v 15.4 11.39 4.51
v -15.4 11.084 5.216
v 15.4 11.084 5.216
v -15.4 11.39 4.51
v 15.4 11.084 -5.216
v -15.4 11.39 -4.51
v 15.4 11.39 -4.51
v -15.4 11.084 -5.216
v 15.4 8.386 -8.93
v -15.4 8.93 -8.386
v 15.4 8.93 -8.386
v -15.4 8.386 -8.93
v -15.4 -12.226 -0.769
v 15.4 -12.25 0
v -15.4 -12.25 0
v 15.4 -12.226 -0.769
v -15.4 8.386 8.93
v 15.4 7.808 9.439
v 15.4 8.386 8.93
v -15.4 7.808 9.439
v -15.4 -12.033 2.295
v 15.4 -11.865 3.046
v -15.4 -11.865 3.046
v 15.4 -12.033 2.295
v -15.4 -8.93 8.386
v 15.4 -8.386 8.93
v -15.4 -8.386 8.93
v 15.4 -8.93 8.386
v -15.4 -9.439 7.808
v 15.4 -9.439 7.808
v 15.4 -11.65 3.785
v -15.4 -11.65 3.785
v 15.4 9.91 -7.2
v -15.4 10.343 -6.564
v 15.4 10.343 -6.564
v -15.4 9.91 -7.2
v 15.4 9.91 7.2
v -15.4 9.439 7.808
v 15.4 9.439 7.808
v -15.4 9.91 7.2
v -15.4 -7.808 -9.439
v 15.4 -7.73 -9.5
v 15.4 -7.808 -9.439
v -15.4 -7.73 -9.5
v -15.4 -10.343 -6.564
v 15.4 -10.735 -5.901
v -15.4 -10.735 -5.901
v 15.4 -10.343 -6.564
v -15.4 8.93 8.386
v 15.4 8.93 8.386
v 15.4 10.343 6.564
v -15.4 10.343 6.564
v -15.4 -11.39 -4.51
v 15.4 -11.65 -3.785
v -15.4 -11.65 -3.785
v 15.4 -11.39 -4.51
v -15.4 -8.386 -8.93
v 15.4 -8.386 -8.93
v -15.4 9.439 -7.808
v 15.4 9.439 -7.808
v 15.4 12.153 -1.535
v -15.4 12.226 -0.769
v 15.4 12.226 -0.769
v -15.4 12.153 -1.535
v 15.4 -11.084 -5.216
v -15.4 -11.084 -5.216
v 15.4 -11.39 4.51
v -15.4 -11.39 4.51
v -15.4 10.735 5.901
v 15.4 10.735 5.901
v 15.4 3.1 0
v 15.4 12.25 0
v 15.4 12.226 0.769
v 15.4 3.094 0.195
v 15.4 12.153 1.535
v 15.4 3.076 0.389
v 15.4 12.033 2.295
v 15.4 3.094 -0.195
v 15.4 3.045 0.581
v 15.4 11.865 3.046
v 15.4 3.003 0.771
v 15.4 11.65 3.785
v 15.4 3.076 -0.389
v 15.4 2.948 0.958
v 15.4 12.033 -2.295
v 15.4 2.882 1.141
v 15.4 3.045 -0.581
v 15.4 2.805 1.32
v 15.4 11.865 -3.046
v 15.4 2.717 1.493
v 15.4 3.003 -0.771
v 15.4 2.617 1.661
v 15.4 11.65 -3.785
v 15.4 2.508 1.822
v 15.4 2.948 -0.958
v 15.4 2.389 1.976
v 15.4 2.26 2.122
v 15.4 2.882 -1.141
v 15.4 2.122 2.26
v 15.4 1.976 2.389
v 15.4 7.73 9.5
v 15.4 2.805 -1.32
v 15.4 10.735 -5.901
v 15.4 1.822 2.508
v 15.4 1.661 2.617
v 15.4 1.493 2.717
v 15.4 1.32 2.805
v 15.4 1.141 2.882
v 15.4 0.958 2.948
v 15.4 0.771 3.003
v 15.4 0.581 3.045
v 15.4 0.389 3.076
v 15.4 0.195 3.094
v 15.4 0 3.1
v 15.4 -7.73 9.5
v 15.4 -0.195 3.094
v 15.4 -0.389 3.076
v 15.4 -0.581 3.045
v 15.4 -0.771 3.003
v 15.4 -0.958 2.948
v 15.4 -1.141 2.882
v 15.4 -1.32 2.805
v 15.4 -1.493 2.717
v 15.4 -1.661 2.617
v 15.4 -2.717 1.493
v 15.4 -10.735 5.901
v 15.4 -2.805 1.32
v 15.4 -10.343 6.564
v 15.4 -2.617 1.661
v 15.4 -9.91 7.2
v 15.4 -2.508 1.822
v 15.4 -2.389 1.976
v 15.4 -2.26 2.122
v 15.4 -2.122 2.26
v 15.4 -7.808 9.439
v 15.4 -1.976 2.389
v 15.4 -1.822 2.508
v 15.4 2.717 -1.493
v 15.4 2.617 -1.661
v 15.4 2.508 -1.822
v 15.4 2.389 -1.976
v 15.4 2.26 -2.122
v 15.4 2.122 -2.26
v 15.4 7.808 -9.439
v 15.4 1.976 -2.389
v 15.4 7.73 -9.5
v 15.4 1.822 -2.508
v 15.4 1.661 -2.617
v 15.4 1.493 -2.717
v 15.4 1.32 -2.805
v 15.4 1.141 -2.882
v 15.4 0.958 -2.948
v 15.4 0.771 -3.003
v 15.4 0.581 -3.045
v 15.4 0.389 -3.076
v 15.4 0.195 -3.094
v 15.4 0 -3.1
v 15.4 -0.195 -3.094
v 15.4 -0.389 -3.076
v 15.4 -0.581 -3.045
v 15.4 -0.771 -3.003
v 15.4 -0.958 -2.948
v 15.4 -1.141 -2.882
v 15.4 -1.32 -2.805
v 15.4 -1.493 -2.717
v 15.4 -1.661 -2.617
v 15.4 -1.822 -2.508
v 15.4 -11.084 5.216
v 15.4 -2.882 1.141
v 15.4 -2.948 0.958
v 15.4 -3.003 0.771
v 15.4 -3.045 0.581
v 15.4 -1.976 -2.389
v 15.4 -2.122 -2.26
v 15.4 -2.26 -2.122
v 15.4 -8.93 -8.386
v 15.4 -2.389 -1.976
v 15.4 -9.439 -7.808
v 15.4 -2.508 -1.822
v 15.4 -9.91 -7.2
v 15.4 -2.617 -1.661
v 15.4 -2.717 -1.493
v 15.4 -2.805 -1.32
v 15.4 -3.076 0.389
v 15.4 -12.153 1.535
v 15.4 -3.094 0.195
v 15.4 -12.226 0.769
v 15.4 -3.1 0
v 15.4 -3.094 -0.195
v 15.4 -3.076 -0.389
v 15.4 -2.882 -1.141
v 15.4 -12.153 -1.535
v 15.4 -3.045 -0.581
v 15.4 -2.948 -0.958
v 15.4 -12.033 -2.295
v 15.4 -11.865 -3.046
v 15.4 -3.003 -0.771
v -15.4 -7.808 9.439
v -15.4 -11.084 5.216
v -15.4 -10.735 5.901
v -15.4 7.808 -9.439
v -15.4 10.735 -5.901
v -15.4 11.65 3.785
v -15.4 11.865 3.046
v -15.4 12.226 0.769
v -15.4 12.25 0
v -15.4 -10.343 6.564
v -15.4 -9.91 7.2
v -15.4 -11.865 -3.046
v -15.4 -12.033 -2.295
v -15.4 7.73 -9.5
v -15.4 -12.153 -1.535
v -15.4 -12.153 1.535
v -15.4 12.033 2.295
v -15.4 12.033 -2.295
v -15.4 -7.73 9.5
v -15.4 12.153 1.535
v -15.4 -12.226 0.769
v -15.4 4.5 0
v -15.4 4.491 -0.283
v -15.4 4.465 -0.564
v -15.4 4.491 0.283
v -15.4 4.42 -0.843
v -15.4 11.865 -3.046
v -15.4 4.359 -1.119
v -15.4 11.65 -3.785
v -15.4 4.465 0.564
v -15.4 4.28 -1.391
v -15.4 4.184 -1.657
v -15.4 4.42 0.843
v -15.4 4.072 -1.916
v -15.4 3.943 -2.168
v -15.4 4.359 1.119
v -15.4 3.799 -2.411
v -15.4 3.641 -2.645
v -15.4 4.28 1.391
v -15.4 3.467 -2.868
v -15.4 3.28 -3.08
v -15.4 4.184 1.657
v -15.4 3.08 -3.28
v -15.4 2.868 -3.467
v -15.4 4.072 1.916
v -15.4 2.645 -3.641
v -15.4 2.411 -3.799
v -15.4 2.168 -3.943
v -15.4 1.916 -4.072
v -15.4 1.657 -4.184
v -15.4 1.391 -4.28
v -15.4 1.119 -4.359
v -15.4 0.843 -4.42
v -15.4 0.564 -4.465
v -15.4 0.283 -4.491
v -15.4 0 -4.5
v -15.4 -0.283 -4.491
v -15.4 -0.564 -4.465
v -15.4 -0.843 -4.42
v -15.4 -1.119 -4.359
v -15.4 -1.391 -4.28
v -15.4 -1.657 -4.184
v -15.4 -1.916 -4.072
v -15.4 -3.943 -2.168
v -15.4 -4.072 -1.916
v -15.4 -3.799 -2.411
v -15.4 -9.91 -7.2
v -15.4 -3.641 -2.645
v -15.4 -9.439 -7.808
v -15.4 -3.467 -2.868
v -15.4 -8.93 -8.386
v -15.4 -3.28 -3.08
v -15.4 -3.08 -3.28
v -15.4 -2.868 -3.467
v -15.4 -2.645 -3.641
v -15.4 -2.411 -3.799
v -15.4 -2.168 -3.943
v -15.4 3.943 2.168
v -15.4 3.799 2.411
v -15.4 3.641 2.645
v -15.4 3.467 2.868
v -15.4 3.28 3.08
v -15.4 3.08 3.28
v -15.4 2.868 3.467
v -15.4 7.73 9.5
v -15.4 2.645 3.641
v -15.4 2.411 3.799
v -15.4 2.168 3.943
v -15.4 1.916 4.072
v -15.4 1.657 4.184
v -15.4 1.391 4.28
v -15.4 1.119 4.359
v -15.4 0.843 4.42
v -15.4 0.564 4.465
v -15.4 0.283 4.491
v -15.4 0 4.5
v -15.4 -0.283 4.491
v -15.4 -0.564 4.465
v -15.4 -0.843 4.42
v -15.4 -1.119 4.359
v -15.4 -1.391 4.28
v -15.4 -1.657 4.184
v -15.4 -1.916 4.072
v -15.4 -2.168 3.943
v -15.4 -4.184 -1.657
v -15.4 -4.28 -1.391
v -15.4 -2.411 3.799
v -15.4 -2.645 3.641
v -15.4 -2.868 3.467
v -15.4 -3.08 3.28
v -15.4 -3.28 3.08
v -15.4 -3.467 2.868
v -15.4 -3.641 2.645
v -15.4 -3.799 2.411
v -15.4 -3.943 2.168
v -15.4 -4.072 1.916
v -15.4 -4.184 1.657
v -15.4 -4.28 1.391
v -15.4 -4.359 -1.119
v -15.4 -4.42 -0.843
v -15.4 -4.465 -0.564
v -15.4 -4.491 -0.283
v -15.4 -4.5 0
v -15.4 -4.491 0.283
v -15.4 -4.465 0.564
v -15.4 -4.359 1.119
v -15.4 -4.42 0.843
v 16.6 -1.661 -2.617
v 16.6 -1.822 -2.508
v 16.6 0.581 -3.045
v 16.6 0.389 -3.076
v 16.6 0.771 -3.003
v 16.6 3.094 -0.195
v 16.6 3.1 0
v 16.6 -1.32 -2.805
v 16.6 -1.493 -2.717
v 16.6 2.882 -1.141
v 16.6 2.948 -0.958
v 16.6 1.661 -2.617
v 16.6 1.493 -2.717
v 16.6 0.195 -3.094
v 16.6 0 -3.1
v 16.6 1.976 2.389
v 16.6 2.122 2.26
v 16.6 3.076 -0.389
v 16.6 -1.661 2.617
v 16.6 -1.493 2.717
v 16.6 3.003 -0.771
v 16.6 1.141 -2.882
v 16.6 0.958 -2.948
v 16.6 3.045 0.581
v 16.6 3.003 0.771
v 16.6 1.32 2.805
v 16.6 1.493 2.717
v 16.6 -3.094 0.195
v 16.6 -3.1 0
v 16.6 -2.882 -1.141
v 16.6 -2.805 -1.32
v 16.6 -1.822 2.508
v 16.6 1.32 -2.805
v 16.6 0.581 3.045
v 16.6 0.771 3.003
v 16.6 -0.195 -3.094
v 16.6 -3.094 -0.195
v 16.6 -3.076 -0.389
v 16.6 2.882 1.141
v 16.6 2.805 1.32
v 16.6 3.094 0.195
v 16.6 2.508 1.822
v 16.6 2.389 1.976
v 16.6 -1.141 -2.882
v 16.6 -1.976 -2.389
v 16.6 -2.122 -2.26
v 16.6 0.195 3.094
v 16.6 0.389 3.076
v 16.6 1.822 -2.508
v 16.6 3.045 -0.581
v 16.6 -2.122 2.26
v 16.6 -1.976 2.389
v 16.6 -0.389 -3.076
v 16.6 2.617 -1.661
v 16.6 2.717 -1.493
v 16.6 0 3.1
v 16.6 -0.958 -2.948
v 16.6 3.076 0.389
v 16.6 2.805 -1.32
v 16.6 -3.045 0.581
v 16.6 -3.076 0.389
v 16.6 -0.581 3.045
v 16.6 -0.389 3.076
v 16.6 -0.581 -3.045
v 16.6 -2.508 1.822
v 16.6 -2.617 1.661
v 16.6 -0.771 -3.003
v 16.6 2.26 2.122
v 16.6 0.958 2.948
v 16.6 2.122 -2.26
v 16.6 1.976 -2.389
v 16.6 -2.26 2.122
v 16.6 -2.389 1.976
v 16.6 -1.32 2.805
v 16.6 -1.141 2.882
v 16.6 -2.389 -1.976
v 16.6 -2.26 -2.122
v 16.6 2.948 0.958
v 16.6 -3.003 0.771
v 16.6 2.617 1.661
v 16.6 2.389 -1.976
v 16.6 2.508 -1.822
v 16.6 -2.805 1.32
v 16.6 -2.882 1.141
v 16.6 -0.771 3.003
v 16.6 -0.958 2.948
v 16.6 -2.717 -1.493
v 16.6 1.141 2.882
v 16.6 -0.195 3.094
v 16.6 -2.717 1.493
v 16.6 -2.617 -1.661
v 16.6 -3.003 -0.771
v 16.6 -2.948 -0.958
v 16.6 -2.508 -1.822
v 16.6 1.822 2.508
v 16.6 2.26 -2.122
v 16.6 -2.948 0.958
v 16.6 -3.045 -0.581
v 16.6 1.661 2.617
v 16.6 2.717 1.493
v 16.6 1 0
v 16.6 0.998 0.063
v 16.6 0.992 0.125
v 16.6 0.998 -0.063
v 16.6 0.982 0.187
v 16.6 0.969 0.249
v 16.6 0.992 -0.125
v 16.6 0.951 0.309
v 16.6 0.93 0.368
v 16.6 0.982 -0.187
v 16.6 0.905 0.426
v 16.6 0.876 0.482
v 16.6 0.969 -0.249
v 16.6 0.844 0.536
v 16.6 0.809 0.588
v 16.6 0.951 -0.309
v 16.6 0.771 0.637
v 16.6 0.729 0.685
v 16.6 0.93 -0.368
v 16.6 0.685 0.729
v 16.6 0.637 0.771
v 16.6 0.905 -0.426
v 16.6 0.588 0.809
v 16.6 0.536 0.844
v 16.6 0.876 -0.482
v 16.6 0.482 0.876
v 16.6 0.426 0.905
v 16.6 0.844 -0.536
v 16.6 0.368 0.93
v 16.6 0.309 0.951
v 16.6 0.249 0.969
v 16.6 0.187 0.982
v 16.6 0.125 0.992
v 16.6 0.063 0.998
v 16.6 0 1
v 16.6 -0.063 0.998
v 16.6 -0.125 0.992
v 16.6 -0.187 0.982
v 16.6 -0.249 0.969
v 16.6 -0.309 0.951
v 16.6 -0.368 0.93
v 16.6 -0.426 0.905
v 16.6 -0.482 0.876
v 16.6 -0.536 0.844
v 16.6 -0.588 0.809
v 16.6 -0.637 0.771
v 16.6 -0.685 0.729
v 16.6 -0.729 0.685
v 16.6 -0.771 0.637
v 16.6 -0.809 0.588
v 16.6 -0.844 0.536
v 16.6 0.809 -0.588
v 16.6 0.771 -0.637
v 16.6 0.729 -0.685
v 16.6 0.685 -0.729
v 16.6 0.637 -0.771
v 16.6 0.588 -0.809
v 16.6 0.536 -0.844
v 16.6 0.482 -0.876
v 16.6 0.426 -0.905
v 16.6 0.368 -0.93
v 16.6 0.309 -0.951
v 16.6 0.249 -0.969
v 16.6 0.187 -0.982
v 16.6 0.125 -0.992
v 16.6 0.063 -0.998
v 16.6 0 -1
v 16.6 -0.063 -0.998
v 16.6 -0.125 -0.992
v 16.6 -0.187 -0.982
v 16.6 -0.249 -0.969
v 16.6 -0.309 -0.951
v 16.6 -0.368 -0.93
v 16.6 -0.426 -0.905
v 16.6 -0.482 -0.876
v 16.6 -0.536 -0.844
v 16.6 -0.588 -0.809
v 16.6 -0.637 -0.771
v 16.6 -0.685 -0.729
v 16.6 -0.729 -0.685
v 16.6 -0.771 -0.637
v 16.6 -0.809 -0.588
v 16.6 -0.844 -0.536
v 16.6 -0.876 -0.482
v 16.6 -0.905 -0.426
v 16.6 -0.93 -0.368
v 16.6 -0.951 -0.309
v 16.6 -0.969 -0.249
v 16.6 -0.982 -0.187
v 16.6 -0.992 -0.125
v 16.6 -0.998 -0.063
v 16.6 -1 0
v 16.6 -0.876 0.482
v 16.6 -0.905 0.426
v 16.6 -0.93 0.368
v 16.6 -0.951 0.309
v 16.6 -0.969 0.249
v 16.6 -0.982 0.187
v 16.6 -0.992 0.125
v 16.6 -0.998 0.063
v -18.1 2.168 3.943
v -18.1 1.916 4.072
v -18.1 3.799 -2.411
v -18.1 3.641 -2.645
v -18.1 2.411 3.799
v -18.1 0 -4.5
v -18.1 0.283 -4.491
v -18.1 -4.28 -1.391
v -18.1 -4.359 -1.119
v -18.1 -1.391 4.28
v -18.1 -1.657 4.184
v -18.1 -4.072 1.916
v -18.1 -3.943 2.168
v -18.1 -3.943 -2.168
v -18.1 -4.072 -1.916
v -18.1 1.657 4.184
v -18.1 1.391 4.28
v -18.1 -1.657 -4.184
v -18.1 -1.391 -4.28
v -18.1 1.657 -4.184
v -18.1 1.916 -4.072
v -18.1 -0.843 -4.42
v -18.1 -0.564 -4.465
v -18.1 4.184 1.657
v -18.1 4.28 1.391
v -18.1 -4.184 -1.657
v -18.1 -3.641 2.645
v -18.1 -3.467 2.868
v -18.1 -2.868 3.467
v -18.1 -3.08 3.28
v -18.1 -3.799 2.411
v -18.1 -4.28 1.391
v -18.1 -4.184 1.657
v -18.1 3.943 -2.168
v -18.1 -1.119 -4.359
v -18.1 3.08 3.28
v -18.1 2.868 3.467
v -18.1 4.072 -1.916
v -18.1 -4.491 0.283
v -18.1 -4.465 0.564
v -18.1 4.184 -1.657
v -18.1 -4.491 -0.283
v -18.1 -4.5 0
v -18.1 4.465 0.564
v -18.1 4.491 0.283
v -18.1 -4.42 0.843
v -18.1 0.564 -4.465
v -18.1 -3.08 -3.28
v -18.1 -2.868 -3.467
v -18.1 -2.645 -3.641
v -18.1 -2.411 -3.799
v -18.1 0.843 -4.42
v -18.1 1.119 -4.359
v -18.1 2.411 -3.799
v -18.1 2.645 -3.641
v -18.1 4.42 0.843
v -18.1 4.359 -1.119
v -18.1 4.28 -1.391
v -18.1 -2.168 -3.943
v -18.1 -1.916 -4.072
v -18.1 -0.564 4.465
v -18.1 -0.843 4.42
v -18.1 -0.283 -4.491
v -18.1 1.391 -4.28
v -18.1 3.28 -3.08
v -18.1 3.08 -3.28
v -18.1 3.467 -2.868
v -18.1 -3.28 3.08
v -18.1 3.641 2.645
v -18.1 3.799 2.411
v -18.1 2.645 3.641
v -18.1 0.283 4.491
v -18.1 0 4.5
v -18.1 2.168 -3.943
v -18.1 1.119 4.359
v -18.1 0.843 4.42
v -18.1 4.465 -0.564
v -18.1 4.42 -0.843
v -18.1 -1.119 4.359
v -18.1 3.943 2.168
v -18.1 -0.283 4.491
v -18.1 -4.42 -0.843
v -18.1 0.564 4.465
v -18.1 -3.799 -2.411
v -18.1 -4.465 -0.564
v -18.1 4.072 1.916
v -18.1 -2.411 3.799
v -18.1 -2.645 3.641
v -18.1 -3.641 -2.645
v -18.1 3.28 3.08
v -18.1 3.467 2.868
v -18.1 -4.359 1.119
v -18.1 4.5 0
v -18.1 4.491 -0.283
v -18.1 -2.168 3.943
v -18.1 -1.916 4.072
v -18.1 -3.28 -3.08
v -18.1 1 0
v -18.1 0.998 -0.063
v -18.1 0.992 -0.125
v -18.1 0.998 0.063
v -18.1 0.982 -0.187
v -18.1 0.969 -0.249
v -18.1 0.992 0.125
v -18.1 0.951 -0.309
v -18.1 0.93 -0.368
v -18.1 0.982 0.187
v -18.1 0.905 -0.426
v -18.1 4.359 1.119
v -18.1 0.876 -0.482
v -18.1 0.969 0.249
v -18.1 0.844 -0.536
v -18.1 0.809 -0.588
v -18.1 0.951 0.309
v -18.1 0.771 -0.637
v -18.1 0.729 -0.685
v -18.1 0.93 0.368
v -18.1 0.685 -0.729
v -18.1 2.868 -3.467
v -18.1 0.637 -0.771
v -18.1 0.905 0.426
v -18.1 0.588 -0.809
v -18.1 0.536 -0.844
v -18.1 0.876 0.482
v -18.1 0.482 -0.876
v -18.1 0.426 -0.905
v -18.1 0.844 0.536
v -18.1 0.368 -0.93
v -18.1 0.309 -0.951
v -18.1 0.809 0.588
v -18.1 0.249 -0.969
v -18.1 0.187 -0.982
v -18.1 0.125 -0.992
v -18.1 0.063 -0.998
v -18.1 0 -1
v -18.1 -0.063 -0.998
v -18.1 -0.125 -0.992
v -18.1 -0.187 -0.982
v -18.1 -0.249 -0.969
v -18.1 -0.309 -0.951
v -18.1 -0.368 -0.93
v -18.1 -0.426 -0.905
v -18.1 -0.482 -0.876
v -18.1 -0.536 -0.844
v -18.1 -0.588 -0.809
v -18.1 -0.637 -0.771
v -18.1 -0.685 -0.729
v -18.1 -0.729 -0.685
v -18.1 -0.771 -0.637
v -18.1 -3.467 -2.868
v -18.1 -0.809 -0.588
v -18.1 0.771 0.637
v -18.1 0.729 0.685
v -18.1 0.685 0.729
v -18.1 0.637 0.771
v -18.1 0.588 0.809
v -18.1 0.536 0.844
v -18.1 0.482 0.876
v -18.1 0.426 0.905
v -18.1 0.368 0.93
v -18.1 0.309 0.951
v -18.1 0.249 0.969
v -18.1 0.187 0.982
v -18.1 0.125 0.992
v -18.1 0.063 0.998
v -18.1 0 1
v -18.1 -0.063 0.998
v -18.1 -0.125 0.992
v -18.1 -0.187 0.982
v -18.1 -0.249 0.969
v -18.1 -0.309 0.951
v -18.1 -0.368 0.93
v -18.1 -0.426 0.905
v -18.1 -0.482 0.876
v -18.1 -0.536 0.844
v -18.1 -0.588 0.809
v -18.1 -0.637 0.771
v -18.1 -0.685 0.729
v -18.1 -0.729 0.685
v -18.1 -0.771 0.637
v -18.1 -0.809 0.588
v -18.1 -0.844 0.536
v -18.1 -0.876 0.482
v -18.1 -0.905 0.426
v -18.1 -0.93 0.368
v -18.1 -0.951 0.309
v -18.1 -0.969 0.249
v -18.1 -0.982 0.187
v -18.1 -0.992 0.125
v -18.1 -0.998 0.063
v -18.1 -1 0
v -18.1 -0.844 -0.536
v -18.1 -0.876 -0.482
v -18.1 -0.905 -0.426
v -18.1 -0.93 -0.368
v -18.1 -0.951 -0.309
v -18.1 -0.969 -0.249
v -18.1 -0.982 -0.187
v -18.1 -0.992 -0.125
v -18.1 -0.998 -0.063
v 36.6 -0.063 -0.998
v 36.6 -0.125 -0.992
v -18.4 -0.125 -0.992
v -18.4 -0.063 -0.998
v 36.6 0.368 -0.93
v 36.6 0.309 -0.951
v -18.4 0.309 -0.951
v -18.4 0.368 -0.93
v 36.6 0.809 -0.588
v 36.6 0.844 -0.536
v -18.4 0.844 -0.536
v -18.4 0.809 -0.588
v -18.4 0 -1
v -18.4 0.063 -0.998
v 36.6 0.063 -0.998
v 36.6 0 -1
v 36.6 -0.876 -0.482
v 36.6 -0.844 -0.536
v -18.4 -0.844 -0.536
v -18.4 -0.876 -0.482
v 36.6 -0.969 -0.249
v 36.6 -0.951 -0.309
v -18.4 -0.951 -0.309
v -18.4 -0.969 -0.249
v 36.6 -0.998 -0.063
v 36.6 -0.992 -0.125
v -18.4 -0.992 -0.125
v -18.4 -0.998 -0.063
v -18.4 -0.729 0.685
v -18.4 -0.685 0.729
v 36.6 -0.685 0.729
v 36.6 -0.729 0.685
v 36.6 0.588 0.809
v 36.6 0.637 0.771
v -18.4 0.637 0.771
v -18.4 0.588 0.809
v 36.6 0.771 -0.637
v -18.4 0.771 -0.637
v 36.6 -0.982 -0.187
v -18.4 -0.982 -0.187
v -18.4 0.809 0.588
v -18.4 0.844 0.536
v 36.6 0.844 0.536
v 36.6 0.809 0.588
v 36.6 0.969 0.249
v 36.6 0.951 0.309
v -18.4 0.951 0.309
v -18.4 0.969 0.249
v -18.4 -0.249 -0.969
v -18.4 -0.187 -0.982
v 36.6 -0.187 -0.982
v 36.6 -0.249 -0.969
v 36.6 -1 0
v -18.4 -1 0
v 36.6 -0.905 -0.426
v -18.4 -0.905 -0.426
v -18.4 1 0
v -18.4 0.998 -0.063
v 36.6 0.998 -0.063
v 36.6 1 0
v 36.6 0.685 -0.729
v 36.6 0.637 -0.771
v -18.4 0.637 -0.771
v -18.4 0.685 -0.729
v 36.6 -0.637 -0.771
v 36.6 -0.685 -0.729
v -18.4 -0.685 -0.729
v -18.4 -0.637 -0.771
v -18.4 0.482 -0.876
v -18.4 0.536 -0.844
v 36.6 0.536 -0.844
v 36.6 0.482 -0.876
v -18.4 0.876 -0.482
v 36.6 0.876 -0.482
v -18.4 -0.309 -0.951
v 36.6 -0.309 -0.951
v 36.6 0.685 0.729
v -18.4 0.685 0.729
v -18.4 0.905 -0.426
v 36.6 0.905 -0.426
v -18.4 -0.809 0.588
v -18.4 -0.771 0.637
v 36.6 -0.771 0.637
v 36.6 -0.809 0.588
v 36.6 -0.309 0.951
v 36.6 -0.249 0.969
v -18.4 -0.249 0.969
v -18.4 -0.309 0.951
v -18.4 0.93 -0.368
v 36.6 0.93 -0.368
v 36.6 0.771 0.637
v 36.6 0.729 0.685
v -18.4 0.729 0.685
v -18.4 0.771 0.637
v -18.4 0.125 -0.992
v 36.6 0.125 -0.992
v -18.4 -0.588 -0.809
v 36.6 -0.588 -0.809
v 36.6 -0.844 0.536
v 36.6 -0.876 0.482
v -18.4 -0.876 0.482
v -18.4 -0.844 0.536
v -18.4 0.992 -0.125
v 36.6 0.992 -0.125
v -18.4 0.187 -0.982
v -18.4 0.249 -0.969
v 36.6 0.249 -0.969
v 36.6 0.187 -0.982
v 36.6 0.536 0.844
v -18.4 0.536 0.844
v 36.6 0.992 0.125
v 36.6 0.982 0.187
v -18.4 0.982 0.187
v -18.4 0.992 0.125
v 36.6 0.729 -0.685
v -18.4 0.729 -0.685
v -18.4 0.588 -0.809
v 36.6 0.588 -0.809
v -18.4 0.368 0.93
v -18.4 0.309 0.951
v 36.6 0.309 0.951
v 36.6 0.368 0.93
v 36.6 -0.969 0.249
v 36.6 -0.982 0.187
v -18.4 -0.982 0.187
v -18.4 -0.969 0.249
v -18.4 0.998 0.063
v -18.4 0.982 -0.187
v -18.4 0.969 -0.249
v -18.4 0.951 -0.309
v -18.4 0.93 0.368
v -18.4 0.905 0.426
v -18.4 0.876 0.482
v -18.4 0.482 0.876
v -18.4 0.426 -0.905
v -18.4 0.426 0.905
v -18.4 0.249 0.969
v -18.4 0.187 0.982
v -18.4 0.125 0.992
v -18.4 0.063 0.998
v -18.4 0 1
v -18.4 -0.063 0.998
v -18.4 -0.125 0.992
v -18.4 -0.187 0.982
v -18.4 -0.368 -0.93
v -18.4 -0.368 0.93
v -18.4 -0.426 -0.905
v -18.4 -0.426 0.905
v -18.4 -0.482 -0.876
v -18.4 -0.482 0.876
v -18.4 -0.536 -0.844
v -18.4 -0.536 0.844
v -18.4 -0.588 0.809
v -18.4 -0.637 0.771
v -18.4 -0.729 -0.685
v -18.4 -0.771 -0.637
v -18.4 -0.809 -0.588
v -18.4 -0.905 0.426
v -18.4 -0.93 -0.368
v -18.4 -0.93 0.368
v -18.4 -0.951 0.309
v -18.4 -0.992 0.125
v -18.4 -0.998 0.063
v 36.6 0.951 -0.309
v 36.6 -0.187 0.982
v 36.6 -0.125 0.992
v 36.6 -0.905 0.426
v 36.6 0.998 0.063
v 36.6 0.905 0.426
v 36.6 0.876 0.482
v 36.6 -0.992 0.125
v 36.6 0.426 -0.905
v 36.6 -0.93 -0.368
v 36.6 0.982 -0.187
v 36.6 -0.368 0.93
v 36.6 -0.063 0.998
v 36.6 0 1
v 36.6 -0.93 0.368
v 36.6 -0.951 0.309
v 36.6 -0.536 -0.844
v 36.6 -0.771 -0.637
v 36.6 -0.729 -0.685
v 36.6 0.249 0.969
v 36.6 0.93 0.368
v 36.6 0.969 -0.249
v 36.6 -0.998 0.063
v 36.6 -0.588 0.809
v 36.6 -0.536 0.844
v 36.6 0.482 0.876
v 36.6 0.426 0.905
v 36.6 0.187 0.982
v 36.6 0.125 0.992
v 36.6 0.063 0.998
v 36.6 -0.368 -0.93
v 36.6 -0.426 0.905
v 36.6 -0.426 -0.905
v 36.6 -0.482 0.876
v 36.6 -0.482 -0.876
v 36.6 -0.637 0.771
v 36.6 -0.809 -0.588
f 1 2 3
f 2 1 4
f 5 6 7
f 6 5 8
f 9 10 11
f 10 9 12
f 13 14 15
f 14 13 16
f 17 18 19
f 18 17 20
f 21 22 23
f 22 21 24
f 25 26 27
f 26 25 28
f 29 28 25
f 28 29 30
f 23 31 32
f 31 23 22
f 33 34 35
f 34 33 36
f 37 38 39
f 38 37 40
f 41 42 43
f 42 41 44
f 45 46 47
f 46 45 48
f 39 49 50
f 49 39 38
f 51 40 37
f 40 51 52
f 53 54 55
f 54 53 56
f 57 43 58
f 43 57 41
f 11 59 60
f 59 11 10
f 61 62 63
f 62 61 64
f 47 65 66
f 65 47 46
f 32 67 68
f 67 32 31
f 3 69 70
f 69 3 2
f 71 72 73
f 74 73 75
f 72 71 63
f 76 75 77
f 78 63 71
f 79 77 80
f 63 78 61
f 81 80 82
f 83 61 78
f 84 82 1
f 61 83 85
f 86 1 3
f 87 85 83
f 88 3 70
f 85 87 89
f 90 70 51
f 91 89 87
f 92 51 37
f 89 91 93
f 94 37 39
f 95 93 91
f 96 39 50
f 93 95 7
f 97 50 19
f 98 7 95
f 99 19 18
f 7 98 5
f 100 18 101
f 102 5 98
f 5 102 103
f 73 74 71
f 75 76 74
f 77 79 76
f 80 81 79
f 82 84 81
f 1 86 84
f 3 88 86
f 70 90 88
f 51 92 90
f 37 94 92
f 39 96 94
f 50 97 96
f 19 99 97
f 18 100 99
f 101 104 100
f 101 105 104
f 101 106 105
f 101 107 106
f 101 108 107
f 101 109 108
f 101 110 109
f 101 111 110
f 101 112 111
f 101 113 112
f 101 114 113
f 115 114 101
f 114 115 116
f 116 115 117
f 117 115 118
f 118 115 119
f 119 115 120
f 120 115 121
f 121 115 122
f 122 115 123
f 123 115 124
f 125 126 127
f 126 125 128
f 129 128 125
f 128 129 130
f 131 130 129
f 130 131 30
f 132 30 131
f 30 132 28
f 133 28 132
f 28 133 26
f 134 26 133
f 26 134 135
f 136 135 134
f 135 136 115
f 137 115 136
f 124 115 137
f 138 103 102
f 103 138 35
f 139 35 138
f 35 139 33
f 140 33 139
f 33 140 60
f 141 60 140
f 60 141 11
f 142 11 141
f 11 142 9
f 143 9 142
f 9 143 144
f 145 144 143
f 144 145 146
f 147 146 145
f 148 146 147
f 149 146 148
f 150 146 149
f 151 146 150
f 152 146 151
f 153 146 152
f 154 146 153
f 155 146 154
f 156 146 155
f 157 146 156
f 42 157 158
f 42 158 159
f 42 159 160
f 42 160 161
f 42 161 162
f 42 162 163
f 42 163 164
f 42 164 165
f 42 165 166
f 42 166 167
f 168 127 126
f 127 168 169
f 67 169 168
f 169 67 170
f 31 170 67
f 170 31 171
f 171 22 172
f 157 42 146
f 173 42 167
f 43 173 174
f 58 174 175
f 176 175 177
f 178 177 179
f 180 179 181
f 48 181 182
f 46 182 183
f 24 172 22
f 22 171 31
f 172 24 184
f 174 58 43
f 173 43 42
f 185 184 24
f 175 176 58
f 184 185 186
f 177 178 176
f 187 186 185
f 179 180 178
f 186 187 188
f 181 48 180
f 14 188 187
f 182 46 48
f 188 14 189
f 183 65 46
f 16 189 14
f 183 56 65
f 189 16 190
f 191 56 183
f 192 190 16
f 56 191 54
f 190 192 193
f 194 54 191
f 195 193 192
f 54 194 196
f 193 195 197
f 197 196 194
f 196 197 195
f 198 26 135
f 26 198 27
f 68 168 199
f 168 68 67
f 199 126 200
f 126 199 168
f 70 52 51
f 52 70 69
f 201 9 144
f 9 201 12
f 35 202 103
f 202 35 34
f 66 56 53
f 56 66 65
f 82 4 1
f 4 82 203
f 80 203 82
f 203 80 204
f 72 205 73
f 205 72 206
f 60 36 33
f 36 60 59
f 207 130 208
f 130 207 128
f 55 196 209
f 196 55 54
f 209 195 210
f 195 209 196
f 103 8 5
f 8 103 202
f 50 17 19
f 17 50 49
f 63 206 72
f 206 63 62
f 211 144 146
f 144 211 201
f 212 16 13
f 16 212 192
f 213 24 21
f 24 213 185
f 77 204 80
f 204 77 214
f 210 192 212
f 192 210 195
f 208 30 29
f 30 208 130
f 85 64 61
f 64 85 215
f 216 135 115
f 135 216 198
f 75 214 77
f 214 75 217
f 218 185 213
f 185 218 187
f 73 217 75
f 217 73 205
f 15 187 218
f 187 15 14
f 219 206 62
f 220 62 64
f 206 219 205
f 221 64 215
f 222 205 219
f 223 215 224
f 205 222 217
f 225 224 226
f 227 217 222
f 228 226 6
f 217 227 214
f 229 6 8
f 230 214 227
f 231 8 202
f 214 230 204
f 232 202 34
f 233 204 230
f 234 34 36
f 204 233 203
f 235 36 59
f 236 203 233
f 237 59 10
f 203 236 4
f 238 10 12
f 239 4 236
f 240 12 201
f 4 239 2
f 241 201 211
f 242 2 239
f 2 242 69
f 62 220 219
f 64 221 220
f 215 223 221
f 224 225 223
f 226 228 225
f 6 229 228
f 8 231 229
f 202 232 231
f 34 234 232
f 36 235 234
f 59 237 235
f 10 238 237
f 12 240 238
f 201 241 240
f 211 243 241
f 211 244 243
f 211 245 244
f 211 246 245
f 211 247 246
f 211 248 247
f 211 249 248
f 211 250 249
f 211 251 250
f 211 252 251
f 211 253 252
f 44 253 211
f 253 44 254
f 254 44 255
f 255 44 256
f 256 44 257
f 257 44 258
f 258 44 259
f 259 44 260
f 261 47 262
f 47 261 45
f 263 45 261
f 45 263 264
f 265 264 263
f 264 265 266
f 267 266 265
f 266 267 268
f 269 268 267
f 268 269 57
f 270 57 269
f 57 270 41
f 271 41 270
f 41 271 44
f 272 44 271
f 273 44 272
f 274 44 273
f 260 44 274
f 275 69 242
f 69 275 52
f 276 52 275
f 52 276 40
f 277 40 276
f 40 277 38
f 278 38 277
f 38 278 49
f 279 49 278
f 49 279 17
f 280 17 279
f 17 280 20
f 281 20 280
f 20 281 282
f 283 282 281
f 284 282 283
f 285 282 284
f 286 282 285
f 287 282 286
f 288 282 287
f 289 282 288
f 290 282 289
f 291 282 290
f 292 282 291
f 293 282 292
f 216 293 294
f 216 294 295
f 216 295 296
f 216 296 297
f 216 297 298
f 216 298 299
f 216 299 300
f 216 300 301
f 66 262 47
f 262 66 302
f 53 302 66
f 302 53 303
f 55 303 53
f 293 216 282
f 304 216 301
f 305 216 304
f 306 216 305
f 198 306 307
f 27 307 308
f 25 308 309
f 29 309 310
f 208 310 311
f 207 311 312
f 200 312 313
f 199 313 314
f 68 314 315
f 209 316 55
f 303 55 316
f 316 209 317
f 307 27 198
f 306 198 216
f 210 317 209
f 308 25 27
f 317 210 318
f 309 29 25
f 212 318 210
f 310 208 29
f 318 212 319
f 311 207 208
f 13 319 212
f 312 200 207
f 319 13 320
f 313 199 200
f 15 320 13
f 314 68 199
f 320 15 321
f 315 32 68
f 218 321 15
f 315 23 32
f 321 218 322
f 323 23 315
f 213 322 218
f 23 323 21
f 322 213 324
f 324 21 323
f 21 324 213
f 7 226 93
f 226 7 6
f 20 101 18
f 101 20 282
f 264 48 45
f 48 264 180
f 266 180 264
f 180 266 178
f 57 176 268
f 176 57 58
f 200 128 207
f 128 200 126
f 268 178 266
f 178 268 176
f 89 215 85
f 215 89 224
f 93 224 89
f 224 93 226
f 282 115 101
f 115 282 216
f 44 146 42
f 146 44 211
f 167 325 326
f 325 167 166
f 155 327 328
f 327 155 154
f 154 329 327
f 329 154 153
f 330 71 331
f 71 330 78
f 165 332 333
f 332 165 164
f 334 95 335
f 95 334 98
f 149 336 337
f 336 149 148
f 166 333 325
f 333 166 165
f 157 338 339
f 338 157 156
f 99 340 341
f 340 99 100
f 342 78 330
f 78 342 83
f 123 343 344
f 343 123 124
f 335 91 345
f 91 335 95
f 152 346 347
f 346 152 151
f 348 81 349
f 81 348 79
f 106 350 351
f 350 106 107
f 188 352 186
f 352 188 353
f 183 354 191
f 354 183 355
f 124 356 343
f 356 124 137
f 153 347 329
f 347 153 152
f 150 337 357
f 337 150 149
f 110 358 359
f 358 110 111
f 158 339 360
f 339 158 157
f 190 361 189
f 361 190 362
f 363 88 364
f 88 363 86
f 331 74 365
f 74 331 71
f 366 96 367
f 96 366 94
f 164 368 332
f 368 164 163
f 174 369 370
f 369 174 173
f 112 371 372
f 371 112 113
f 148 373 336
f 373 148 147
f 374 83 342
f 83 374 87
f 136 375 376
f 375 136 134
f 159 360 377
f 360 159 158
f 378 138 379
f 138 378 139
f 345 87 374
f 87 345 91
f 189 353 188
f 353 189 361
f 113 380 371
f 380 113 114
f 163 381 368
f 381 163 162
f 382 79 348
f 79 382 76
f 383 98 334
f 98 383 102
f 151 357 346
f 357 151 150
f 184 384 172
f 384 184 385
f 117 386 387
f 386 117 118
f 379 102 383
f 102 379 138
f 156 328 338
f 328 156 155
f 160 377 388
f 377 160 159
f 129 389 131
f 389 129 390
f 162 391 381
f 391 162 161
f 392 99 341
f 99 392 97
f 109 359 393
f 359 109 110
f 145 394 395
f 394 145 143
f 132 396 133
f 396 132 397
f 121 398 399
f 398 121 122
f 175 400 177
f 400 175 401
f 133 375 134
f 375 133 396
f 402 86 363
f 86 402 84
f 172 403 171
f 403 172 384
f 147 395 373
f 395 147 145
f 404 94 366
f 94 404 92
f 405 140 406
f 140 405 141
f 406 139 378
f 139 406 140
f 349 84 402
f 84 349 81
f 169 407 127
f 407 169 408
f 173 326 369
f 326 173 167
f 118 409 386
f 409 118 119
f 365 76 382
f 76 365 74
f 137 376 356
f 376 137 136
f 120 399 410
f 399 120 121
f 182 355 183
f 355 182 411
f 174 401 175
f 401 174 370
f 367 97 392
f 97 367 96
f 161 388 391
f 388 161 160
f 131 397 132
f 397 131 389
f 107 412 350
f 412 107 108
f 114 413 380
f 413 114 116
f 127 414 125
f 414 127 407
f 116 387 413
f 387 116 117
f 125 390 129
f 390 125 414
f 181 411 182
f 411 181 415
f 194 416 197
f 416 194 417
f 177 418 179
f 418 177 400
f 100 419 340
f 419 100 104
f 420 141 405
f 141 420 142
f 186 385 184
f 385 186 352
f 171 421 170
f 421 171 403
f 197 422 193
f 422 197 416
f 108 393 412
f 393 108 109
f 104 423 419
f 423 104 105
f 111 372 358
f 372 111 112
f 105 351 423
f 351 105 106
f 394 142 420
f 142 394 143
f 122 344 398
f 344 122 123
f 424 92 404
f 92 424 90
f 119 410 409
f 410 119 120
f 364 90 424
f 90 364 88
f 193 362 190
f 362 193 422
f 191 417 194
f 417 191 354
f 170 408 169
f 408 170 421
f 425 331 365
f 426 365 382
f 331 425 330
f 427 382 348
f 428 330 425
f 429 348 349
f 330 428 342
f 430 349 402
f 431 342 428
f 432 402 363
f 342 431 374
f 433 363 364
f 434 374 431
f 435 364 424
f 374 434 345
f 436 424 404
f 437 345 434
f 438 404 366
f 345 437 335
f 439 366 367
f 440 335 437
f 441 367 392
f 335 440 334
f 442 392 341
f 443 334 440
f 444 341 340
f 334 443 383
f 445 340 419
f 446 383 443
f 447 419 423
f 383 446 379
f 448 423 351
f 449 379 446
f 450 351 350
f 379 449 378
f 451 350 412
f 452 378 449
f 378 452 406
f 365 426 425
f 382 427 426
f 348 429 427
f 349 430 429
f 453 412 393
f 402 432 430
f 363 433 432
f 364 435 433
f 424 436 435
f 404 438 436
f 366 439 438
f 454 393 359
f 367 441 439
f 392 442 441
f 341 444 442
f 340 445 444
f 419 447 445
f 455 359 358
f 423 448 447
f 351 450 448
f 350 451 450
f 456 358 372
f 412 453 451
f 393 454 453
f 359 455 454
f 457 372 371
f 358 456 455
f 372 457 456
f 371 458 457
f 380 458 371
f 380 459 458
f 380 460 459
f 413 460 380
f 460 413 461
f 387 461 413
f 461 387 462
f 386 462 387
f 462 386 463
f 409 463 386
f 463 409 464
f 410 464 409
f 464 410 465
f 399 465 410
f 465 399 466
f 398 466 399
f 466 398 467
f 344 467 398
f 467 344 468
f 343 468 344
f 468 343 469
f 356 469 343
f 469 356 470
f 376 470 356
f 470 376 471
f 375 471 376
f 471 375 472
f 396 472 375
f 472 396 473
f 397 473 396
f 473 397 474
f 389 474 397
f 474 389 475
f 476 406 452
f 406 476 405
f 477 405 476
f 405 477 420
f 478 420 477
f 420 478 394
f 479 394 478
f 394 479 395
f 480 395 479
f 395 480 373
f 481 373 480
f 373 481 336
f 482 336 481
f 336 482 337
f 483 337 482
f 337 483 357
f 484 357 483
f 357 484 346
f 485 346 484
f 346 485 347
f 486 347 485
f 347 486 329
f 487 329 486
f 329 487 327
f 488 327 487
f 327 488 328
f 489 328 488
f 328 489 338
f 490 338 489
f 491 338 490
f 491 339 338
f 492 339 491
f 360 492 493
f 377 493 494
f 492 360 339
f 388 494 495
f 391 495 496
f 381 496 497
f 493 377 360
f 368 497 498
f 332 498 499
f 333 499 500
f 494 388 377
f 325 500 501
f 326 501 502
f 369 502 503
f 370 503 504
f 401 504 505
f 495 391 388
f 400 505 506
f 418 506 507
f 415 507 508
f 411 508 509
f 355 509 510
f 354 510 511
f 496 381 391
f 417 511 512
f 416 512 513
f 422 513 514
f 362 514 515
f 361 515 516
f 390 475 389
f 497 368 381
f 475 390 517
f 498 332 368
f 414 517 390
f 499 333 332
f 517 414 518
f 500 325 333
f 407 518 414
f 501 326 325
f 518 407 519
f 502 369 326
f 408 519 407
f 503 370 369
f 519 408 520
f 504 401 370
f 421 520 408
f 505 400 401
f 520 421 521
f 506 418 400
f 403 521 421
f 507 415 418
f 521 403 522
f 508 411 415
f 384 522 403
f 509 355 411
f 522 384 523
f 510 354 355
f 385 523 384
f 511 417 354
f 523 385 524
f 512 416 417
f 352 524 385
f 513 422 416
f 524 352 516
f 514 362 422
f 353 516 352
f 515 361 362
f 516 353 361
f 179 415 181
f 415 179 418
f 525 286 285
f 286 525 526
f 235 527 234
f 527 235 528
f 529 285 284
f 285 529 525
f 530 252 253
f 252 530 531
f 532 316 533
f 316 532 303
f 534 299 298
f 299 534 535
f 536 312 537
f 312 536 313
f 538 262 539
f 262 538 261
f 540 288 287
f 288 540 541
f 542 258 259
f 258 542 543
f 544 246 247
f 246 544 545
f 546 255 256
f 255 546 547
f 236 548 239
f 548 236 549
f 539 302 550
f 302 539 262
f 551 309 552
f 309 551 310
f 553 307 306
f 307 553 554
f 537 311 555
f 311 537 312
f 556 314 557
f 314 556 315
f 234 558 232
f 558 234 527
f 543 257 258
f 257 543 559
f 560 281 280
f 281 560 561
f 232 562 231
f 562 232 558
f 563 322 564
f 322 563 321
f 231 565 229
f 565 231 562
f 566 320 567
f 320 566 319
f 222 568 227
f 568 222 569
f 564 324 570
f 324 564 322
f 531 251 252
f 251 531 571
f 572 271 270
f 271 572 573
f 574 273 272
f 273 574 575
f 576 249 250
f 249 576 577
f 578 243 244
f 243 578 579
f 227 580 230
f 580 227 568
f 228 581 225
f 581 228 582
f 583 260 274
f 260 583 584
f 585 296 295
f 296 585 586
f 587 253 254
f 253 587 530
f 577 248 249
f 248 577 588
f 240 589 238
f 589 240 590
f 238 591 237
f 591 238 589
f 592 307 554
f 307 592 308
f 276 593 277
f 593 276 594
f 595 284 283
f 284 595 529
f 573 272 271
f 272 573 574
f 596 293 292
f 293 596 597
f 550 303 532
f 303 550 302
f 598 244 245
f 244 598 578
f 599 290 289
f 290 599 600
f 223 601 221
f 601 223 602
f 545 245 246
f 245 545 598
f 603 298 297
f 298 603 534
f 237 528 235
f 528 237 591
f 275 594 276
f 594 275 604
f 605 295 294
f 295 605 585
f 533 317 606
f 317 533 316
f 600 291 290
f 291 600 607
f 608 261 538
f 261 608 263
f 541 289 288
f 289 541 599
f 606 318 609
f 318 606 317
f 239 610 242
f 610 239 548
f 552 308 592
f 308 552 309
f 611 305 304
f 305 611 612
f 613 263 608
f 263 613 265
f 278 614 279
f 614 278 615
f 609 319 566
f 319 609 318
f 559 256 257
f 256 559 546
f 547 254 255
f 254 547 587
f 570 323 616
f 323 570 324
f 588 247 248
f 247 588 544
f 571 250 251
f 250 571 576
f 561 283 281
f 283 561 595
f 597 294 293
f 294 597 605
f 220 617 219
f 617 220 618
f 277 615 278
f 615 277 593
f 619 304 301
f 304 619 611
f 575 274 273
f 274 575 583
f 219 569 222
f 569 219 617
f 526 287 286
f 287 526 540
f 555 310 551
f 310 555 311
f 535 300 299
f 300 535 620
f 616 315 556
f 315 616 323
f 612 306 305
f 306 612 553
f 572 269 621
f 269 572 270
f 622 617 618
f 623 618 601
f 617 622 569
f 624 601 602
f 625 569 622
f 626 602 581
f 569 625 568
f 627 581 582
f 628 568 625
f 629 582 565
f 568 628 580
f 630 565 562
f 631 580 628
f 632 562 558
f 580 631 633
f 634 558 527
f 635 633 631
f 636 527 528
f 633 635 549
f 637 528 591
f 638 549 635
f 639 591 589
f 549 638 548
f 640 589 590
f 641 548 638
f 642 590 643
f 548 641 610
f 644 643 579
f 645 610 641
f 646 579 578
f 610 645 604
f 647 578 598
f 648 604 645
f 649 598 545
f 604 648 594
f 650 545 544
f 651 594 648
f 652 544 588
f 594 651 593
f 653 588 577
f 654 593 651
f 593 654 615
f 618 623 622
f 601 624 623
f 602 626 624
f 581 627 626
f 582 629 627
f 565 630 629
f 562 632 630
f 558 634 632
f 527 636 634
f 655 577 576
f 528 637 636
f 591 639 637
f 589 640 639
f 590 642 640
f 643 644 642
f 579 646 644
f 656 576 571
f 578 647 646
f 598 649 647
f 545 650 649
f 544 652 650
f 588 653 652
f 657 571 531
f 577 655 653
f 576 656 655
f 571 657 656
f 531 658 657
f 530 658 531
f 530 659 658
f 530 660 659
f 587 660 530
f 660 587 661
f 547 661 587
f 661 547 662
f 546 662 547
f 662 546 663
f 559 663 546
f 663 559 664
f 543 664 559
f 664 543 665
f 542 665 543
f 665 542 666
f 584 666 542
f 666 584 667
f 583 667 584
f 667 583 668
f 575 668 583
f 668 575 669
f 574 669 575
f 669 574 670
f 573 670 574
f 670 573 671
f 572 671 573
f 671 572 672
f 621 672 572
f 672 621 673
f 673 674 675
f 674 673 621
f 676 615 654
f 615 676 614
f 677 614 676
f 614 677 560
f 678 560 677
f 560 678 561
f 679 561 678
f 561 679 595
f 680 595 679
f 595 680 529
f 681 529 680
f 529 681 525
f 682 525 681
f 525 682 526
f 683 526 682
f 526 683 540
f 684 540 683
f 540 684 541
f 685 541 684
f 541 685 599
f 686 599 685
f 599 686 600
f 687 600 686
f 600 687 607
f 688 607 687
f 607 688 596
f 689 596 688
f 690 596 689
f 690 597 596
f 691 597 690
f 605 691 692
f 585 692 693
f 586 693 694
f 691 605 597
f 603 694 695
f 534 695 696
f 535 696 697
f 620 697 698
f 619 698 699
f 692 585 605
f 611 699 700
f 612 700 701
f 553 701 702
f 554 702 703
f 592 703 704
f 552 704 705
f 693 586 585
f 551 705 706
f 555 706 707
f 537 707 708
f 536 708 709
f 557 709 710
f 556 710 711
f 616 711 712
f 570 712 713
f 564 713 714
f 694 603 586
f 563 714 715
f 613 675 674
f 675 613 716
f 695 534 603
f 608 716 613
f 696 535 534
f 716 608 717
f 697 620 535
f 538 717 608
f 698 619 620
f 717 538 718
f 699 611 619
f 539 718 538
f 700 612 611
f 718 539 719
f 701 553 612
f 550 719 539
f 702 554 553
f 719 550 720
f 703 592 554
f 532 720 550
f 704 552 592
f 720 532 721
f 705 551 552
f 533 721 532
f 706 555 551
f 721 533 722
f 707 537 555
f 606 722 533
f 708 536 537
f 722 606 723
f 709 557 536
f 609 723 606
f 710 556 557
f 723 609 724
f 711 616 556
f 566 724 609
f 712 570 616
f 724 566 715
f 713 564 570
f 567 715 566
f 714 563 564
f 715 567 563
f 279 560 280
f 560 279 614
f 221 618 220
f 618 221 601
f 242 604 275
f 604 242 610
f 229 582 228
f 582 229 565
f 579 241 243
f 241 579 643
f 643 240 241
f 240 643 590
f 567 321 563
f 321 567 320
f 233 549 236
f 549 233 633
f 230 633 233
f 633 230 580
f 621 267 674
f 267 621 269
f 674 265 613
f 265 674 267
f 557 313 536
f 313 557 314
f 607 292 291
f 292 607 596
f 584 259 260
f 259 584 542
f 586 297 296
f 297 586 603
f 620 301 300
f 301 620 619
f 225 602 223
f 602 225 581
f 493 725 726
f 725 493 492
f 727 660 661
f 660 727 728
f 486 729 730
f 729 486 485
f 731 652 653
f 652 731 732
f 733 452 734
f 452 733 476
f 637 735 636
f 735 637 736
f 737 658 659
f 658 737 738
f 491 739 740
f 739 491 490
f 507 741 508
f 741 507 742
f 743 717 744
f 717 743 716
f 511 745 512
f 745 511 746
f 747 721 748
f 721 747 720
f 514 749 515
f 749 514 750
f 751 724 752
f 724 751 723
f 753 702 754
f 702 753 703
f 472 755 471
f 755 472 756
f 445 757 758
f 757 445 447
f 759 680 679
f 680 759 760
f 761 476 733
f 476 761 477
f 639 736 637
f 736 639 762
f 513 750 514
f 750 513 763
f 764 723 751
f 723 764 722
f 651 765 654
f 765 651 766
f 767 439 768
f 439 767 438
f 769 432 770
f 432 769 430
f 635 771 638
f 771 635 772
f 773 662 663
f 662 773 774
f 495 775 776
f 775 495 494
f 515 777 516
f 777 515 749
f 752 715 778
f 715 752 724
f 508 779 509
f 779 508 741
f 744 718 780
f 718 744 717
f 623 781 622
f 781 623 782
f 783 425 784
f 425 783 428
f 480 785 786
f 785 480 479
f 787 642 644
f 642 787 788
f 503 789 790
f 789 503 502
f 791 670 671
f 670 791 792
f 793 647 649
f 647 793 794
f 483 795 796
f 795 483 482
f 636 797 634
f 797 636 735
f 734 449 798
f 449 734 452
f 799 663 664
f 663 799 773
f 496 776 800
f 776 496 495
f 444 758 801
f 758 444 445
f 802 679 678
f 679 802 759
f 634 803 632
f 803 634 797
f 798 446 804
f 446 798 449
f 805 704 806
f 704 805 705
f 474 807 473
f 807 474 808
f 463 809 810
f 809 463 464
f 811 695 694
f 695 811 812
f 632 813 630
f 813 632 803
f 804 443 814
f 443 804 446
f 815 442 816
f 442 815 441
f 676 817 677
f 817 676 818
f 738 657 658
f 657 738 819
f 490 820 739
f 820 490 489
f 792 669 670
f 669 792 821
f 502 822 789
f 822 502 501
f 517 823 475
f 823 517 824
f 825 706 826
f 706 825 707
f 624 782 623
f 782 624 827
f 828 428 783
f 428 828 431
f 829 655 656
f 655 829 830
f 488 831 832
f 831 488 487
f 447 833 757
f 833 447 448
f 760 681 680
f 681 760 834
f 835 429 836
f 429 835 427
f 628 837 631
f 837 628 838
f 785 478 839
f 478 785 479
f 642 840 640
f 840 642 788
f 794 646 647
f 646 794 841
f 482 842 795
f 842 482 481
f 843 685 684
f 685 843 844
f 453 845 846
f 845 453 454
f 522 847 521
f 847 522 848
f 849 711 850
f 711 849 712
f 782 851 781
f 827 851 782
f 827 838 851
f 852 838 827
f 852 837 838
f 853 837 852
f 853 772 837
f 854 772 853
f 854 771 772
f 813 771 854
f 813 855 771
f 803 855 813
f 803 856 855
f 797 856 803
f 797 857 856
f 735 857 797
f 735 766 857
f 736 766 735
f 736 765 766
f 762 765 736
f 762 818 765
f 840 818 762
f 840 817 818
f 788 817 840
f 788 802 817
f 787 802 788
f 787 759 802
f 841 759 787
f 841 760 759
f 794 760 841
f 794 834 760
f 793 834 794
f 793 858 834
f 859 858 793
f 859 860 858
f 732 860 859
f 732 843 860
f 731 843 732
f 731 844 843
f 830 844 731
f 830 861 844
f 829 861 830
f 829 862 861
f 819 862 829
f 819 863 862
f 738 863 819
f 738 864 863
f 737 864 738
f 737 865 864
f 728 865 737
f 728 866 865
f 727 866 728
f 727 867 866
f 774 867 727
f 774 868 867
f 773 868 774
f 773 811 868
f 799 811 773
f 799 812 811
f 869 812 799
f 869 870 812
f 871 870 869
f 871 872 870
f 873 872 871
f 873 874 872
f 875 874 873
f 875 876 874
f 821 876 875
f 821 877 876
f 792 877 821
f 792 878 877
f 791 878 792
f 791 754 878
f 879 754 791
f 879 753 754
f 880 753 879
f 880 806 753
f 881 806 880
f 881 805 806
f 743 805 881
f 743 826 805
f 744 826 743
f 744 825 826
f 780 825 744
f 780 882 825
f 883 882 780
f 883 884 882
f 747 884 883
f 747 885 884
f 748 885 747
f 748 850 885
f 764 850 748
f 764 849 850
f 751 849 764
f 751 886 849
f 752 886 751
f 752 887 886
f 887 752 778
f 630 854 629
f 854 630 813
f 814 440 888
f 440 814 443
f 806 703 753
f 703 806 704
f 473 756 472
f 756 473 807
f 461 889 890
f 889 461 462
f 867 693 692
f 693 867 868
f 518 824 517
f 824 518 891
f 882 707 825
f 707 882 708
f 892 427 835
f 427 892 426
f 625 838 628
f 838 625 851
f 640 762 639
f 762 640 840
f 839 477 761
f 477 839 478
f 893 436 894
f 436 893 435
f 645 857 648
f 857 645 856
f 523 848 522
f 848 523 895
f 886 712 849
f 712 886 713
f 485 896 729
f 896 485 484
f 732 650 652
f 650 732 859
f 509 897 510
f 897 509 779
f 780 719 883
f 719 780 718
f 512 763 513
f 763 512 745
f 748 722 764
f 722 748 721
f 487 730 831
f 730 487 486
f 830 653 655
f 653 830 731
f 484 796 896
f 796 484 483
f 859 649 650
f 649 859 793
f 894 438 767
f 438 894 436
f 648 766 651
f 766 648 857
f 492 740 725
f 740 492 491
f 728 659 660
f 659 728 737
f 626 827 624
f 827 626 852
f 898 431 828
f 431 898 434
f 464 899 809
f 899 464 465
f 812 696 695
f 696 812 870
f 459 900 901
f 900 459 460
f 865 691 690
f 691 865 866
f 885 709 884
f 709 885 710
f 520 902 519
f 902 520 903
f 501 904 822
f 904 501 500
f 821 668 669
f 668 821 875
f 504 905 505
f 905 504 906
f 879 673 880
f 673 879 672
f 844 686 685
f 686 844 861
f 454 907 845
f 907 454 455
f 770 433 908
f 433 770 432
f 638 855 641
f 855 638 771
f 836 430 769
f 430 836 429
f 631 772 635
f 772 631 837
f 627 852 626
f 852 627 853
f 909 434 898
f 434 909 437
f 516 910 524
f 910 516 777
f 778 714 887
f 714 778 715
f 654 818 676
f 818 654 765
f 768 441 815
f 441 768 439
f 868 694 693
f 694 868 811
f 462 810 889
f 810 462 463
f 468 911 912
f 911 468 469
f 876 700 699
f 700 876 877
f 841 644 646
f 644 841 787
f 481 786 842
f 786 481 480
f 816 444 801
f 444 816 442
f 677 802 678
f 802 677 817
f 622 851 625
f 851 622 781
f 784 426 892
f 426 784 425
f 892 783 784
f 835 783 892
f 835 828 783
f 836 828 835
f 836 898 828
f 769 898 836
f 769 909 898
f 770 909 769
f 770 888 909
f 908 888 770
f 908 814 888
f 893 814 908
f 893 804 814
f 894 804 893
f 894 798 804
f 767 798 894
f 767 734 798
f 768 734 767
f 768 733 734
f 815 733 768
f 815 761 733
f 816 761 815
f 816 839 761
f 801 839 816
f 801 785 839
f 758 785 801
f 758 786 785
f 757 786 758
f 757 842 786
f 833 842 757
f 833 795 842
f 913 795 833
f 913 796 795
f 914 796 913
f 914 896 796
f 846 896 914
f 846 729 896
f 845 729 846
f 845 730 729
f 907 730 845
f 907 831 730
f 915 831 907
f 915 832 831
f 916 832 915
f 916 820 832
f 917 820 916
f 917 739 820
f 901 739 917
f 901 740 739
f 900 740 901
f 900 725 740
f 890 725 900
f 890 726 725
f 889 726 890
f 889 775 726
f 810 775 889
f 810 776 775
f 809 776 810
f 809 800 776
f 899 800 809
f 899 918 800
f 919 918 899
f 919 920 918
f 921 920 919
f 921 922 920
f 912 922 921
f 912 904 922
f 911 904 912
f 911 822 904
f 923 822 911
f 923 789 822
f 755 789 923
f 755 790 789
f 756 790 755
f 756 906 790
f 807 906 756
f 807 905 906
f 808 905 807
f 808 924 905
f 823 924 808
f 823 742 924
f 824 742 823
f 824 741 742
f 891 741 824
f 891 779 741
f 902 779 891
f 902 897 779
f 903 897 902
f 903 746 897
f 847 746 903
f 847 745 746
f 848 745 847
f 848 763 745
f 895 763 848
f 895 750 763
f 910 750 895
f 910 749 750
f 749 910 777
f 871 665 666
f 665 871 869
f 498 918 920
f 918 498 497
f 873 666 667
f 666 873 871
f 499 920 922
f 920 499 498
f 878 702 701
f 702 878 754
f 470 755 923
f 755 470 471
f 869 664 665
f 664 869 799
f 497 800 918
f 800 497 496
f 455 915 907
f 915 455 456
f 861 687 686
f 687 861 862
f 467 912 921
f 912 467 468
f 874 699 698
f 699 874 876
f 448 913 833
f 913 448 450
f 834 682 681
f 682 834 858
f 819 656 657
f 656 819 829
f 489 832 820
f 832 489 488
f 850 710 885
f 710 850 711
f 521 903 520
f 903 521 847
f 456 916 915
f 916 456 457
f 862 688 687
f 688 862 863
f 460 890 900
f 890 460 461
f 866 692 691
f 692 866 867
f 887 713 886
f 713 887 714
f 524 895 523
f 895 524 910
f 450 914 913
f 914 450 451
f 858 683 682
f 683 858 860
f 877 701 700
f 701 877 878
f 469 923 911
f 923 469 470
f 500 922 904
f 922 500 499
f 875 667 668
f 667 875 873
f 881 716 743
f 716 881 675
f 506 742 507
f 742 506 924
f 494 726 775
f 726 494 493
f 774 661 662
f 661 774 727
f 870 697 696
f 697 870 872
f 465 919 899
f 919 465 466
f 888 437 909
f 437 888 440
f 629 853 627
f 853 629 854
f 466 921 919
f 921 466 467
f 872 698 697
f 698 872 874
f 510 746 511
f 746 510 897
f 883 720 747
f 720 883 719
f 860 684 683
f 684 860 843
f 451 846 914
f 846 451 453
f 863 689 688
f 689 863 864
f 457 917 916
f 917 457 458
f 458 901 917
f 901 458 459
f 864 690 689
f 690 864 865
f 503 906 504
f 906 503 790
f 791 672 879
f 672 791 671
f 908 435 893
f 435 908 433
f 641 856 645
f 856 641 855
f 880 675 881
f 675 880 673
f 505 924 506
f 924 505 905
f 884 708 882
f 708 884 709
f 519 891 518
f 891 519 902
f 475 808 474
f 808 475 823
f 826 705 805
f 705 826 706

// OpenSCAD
/*
	Openscad modell for Johnson NF243G-20242 Motor

	2015 by ChrisMicro

*/

$fn=100; // resolution
manuFactoringOffset=0.5;

motorDiameter   = manuFactoringOffset+24;
motorHeight     = manuFactoringOffset+18.5;
motorBodyLength = manuFactoringOffset+30.3;

axisLength      = 20;
axisTotalLength = 55;
axisDiameter    = 2;

frontRingDiameter = 6.2;
frontRingLength   = 1.2;

backRingDiameter  = manuFactoringOffset+8.5;
backRingLength    = manuFactoringOffset+1.7+.5;

ringInlayOffset=2; // this is only to prevent rendering errors
 
motor();

function get_motorDiameter()=motorDiameter;
function get_motorHeight()=motorHeight;

axisShift=axisTotalLength-(motorBodyLength+frontRingLength+axisLength);


module motor()
{
	// front ring
	translate([motorBodyLength/2-ringInlayOffset,0,0]) rotate([0,90,0])	
		cylinder(h = frontRingLength+ringInlayOffset, r = frontRingDiameter/2, center = false);

	// back ring
	translate([-motorBodyLength/2-backRingLength,0,0]) rotate([0,90,0])	
		cylinder(h = backRingLength+ringInlayOffset, r = backRingDiameter/2, center = false);

	// axis
	color("grey") translate([-motorBodyLength/2-axisShift,0,0]) rotate([0,90,0])	
		cylinder(h = axisTotalLength, r = axisDiameter/2, center = false);

	// body
	color("grey") intersection()
	{
		translate([-motorBodyLength/2,0,0]) rotate([0,90,0])	
			cylinder(h = motorBodyLength, r = motorDiameter/2, center = false);
			cube(size = [motorBodyLength,motorDiameter,motorHeight], center = true);
	}
}
